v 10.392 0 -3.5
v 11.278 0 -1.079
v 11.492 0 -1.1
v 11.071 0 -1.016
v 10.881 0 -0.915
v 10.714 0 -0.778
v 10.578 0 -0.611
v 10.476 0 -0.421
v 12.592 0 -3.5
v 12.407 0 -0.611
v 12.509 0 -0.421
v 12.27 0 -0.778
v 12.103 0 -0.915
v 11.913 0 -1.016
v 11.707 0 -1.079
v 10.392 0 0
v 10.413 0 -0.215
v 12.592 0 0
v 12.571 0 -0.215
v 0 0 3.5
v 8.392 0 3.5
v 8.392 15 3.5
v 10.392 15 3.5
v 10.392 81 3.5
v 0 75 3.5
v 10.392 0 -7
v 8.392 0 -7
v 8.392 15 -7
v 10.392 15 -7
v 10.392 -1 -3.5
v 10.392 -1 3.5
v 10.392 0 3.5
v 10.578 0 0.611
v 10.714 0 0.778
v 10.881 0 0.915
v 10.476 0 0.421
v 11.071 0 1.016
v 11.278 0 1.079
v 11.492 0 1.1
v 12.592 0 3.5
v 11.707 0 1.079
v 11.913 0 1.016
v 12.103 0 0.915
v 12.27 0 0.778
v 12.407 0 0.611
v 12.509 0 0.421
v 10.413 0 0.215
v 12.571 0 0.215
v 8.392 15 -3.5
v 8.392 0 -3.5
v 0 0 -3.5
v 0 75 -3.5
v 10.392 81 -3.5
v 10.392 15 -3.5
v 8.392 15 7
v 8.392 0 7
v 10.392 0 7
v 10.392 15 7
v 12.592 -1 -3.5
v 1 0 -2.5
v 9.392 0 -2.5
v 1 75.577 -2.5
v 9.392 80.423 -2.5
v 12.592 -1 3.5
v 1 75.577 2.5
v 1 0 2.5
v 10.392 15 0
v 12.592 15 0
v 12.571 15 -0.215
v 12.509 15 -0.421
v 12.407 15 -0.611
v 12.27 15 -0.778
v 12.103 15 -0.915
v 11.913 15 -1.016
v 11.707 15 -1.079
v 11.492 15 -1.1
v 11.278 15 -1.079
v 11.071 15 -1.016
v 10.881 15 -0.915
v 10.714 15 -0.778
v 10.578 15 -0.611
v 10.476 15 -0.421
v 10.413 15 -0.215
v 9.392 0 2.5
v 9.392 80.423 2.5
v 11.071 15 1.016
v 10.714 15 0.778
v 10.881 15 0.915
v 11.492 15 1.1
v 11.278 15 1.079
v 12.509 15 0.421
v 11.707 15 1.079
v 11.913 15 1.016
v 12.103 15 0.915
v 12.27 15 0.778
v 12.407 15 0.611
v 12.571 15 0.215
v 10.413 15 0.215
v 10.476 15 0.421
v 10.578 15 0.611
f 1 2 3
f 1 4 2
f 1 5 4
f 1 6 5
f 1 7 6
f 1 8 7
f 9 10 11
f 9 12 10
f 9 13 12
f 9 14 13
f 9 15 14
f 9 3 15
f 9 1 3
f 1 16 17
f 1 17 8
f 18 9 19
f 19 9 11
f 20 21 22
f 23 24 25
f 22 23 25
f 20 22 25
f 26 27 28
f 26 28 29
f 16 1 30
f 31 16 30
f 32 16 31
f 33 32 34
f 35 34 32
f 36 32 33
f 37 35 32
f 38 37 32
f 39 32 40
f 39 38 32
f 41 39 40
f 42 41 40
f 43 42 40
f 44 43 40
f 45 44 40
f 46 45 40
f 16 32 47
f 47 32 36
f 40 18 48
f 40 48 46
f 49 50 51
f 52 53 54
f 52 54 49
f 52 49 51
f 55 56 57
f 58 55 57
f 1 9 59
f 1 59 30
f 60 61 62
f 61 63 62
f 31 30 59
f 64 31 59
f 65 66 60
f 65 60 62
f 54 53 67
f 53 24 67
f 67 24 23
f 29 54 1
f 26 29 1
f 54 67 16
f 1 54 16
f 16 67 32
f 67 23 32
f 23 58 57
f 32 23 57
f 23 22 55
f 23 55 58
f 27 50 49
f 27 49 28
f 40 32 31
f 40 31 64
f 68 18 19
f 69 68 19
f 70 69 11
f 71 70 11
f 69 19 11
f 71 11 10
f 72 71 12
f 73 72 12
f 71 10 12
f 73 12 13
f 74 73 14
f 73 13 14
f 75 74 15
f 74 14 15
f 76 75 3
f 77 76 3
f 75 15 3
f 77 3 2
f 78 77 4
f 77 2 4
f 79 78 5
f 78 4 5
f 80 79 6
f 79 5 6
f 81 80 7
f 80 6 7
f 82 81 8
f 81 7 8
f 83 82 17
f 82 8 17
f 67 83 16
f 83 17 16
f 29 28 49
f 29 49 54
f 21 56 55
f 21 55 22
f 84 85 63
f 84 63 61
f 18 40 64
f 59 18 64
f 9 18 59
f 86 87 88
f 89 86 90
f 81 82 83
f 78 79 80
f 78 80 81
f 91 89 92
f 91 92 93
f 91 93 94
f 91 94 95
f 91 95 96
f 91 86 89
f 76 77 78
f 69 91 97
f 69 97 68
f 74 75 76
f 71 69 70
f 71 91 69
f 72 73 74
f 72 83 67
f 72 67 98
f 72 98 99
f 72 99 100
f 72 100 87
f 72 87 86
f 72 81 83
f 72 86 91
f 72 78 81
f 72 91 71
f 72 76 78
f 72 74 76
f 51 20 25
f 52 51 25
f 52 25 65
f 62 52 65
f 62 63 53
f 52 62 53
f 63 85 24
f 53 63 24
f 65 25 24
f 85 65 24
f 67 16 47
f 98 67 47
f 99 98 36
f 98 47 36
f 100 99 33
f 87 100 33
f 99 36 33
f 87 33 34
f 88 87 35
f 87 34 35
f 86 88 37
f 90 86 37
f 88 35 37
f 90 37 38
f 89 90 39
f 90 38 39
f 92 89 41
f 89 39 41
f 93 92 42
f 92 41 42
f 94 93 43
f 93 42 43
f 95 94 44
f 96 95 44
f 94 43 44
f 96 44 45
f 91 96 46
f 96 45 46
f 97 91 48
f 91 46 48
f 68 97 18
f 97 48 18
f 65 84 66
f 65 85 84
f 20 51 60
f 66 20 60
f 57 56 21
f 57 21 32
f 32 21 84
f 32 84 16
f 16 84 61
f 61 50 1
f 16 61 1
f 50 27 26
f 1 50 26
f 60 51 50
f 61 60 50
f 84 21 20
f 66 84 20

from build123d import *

# Parameters (mm, degrees)
BOSS_EXTRUDE1_DEPTH = 3.5
SHELL1_T            = -1
SKETCH3_W           = 2
SKETCH3_H           = 3.5
SKETCH3_R           = 1.1
BOSS_EXTRUDE2_DEPTH = 15
SKETCH3_6_W         = 2.2
SKETCH3_6_H         = 7
BOSS_EXTRUDE5_DEPTH = 1


with BuildPart() as part:
    # Sketch2 → Boss-Extrude1 (new, symmetric)
    with BuildSketch(Plane.XY):
        Polygon((0, 0), (0, 75), (10.392304845, 81), (10.392304845, 0), align=None)
    extrude(amount=BOSS_EXTRUDE1_DEPTH, both=True)

    # Shell1
    shell1_openings = [part.faces().sort_by_distance(p)[0] for p in [
        (5.196152423, 0, 0),
        (5.196152423, 78, 0),
    ]]
    offset(amount=SHELL1_T, openings=shell1_openings, kind=Kind.INTERSECTION)

    # Sketch3 → Boss-Extrude2 (add)
    with BuildSketch(Plane(origin=(0, 0, 0), x_dir=(1, 0, 0), z_dir=(0, 1, 0))):
        with Locations((9.392304845, -5.25)):
            Rectangle(SKETCH3_W, SKETCH3_H)
        with Locations((9.392304845, 5.25)):
            Rectangle(SKETCH3_W, SKETCH3_H)
        with Locations((11.492304845, 0)):
            Circle(SKETCH3_R)
    extrude(amount=BOSS_EXTRUDE2_DEPTH)


with BuildPart() as boss_extrude2_piece_1:
    # of the separate pieces the step leaves, piece 1, a body of its own (boss_extrude2_pieces)
    add(part.part.solids().sort_by_distance((0, 0, -3.5))[0])


with BuildPart() as boss_extrude2_piece_2:
    # of the separate pieces the step leaves, piece 2, a body of its own (boss_extrude2_pieces)
    add(part.part.solids().sort_by_distance((12.592304845, 0, 0))[0])

    # Sketch3<6> → Boss-Extrude5 (add)
    with BuildSketch(Plane(origin=(0, 0, 0), x_dir=(1, 0, 0), z_dir=(0, 1, 0))):
        with Locations((11.492304845, 0)):
            Rectangle(SKETCH3_6_W, SKETCH3_6_H)
    extrude(amount=-BOSS_EXTRUDE5_DEPTH)


solid = Compound([boss_extrude2_piece_1.part, boss_extrude2_piece_2.part])
